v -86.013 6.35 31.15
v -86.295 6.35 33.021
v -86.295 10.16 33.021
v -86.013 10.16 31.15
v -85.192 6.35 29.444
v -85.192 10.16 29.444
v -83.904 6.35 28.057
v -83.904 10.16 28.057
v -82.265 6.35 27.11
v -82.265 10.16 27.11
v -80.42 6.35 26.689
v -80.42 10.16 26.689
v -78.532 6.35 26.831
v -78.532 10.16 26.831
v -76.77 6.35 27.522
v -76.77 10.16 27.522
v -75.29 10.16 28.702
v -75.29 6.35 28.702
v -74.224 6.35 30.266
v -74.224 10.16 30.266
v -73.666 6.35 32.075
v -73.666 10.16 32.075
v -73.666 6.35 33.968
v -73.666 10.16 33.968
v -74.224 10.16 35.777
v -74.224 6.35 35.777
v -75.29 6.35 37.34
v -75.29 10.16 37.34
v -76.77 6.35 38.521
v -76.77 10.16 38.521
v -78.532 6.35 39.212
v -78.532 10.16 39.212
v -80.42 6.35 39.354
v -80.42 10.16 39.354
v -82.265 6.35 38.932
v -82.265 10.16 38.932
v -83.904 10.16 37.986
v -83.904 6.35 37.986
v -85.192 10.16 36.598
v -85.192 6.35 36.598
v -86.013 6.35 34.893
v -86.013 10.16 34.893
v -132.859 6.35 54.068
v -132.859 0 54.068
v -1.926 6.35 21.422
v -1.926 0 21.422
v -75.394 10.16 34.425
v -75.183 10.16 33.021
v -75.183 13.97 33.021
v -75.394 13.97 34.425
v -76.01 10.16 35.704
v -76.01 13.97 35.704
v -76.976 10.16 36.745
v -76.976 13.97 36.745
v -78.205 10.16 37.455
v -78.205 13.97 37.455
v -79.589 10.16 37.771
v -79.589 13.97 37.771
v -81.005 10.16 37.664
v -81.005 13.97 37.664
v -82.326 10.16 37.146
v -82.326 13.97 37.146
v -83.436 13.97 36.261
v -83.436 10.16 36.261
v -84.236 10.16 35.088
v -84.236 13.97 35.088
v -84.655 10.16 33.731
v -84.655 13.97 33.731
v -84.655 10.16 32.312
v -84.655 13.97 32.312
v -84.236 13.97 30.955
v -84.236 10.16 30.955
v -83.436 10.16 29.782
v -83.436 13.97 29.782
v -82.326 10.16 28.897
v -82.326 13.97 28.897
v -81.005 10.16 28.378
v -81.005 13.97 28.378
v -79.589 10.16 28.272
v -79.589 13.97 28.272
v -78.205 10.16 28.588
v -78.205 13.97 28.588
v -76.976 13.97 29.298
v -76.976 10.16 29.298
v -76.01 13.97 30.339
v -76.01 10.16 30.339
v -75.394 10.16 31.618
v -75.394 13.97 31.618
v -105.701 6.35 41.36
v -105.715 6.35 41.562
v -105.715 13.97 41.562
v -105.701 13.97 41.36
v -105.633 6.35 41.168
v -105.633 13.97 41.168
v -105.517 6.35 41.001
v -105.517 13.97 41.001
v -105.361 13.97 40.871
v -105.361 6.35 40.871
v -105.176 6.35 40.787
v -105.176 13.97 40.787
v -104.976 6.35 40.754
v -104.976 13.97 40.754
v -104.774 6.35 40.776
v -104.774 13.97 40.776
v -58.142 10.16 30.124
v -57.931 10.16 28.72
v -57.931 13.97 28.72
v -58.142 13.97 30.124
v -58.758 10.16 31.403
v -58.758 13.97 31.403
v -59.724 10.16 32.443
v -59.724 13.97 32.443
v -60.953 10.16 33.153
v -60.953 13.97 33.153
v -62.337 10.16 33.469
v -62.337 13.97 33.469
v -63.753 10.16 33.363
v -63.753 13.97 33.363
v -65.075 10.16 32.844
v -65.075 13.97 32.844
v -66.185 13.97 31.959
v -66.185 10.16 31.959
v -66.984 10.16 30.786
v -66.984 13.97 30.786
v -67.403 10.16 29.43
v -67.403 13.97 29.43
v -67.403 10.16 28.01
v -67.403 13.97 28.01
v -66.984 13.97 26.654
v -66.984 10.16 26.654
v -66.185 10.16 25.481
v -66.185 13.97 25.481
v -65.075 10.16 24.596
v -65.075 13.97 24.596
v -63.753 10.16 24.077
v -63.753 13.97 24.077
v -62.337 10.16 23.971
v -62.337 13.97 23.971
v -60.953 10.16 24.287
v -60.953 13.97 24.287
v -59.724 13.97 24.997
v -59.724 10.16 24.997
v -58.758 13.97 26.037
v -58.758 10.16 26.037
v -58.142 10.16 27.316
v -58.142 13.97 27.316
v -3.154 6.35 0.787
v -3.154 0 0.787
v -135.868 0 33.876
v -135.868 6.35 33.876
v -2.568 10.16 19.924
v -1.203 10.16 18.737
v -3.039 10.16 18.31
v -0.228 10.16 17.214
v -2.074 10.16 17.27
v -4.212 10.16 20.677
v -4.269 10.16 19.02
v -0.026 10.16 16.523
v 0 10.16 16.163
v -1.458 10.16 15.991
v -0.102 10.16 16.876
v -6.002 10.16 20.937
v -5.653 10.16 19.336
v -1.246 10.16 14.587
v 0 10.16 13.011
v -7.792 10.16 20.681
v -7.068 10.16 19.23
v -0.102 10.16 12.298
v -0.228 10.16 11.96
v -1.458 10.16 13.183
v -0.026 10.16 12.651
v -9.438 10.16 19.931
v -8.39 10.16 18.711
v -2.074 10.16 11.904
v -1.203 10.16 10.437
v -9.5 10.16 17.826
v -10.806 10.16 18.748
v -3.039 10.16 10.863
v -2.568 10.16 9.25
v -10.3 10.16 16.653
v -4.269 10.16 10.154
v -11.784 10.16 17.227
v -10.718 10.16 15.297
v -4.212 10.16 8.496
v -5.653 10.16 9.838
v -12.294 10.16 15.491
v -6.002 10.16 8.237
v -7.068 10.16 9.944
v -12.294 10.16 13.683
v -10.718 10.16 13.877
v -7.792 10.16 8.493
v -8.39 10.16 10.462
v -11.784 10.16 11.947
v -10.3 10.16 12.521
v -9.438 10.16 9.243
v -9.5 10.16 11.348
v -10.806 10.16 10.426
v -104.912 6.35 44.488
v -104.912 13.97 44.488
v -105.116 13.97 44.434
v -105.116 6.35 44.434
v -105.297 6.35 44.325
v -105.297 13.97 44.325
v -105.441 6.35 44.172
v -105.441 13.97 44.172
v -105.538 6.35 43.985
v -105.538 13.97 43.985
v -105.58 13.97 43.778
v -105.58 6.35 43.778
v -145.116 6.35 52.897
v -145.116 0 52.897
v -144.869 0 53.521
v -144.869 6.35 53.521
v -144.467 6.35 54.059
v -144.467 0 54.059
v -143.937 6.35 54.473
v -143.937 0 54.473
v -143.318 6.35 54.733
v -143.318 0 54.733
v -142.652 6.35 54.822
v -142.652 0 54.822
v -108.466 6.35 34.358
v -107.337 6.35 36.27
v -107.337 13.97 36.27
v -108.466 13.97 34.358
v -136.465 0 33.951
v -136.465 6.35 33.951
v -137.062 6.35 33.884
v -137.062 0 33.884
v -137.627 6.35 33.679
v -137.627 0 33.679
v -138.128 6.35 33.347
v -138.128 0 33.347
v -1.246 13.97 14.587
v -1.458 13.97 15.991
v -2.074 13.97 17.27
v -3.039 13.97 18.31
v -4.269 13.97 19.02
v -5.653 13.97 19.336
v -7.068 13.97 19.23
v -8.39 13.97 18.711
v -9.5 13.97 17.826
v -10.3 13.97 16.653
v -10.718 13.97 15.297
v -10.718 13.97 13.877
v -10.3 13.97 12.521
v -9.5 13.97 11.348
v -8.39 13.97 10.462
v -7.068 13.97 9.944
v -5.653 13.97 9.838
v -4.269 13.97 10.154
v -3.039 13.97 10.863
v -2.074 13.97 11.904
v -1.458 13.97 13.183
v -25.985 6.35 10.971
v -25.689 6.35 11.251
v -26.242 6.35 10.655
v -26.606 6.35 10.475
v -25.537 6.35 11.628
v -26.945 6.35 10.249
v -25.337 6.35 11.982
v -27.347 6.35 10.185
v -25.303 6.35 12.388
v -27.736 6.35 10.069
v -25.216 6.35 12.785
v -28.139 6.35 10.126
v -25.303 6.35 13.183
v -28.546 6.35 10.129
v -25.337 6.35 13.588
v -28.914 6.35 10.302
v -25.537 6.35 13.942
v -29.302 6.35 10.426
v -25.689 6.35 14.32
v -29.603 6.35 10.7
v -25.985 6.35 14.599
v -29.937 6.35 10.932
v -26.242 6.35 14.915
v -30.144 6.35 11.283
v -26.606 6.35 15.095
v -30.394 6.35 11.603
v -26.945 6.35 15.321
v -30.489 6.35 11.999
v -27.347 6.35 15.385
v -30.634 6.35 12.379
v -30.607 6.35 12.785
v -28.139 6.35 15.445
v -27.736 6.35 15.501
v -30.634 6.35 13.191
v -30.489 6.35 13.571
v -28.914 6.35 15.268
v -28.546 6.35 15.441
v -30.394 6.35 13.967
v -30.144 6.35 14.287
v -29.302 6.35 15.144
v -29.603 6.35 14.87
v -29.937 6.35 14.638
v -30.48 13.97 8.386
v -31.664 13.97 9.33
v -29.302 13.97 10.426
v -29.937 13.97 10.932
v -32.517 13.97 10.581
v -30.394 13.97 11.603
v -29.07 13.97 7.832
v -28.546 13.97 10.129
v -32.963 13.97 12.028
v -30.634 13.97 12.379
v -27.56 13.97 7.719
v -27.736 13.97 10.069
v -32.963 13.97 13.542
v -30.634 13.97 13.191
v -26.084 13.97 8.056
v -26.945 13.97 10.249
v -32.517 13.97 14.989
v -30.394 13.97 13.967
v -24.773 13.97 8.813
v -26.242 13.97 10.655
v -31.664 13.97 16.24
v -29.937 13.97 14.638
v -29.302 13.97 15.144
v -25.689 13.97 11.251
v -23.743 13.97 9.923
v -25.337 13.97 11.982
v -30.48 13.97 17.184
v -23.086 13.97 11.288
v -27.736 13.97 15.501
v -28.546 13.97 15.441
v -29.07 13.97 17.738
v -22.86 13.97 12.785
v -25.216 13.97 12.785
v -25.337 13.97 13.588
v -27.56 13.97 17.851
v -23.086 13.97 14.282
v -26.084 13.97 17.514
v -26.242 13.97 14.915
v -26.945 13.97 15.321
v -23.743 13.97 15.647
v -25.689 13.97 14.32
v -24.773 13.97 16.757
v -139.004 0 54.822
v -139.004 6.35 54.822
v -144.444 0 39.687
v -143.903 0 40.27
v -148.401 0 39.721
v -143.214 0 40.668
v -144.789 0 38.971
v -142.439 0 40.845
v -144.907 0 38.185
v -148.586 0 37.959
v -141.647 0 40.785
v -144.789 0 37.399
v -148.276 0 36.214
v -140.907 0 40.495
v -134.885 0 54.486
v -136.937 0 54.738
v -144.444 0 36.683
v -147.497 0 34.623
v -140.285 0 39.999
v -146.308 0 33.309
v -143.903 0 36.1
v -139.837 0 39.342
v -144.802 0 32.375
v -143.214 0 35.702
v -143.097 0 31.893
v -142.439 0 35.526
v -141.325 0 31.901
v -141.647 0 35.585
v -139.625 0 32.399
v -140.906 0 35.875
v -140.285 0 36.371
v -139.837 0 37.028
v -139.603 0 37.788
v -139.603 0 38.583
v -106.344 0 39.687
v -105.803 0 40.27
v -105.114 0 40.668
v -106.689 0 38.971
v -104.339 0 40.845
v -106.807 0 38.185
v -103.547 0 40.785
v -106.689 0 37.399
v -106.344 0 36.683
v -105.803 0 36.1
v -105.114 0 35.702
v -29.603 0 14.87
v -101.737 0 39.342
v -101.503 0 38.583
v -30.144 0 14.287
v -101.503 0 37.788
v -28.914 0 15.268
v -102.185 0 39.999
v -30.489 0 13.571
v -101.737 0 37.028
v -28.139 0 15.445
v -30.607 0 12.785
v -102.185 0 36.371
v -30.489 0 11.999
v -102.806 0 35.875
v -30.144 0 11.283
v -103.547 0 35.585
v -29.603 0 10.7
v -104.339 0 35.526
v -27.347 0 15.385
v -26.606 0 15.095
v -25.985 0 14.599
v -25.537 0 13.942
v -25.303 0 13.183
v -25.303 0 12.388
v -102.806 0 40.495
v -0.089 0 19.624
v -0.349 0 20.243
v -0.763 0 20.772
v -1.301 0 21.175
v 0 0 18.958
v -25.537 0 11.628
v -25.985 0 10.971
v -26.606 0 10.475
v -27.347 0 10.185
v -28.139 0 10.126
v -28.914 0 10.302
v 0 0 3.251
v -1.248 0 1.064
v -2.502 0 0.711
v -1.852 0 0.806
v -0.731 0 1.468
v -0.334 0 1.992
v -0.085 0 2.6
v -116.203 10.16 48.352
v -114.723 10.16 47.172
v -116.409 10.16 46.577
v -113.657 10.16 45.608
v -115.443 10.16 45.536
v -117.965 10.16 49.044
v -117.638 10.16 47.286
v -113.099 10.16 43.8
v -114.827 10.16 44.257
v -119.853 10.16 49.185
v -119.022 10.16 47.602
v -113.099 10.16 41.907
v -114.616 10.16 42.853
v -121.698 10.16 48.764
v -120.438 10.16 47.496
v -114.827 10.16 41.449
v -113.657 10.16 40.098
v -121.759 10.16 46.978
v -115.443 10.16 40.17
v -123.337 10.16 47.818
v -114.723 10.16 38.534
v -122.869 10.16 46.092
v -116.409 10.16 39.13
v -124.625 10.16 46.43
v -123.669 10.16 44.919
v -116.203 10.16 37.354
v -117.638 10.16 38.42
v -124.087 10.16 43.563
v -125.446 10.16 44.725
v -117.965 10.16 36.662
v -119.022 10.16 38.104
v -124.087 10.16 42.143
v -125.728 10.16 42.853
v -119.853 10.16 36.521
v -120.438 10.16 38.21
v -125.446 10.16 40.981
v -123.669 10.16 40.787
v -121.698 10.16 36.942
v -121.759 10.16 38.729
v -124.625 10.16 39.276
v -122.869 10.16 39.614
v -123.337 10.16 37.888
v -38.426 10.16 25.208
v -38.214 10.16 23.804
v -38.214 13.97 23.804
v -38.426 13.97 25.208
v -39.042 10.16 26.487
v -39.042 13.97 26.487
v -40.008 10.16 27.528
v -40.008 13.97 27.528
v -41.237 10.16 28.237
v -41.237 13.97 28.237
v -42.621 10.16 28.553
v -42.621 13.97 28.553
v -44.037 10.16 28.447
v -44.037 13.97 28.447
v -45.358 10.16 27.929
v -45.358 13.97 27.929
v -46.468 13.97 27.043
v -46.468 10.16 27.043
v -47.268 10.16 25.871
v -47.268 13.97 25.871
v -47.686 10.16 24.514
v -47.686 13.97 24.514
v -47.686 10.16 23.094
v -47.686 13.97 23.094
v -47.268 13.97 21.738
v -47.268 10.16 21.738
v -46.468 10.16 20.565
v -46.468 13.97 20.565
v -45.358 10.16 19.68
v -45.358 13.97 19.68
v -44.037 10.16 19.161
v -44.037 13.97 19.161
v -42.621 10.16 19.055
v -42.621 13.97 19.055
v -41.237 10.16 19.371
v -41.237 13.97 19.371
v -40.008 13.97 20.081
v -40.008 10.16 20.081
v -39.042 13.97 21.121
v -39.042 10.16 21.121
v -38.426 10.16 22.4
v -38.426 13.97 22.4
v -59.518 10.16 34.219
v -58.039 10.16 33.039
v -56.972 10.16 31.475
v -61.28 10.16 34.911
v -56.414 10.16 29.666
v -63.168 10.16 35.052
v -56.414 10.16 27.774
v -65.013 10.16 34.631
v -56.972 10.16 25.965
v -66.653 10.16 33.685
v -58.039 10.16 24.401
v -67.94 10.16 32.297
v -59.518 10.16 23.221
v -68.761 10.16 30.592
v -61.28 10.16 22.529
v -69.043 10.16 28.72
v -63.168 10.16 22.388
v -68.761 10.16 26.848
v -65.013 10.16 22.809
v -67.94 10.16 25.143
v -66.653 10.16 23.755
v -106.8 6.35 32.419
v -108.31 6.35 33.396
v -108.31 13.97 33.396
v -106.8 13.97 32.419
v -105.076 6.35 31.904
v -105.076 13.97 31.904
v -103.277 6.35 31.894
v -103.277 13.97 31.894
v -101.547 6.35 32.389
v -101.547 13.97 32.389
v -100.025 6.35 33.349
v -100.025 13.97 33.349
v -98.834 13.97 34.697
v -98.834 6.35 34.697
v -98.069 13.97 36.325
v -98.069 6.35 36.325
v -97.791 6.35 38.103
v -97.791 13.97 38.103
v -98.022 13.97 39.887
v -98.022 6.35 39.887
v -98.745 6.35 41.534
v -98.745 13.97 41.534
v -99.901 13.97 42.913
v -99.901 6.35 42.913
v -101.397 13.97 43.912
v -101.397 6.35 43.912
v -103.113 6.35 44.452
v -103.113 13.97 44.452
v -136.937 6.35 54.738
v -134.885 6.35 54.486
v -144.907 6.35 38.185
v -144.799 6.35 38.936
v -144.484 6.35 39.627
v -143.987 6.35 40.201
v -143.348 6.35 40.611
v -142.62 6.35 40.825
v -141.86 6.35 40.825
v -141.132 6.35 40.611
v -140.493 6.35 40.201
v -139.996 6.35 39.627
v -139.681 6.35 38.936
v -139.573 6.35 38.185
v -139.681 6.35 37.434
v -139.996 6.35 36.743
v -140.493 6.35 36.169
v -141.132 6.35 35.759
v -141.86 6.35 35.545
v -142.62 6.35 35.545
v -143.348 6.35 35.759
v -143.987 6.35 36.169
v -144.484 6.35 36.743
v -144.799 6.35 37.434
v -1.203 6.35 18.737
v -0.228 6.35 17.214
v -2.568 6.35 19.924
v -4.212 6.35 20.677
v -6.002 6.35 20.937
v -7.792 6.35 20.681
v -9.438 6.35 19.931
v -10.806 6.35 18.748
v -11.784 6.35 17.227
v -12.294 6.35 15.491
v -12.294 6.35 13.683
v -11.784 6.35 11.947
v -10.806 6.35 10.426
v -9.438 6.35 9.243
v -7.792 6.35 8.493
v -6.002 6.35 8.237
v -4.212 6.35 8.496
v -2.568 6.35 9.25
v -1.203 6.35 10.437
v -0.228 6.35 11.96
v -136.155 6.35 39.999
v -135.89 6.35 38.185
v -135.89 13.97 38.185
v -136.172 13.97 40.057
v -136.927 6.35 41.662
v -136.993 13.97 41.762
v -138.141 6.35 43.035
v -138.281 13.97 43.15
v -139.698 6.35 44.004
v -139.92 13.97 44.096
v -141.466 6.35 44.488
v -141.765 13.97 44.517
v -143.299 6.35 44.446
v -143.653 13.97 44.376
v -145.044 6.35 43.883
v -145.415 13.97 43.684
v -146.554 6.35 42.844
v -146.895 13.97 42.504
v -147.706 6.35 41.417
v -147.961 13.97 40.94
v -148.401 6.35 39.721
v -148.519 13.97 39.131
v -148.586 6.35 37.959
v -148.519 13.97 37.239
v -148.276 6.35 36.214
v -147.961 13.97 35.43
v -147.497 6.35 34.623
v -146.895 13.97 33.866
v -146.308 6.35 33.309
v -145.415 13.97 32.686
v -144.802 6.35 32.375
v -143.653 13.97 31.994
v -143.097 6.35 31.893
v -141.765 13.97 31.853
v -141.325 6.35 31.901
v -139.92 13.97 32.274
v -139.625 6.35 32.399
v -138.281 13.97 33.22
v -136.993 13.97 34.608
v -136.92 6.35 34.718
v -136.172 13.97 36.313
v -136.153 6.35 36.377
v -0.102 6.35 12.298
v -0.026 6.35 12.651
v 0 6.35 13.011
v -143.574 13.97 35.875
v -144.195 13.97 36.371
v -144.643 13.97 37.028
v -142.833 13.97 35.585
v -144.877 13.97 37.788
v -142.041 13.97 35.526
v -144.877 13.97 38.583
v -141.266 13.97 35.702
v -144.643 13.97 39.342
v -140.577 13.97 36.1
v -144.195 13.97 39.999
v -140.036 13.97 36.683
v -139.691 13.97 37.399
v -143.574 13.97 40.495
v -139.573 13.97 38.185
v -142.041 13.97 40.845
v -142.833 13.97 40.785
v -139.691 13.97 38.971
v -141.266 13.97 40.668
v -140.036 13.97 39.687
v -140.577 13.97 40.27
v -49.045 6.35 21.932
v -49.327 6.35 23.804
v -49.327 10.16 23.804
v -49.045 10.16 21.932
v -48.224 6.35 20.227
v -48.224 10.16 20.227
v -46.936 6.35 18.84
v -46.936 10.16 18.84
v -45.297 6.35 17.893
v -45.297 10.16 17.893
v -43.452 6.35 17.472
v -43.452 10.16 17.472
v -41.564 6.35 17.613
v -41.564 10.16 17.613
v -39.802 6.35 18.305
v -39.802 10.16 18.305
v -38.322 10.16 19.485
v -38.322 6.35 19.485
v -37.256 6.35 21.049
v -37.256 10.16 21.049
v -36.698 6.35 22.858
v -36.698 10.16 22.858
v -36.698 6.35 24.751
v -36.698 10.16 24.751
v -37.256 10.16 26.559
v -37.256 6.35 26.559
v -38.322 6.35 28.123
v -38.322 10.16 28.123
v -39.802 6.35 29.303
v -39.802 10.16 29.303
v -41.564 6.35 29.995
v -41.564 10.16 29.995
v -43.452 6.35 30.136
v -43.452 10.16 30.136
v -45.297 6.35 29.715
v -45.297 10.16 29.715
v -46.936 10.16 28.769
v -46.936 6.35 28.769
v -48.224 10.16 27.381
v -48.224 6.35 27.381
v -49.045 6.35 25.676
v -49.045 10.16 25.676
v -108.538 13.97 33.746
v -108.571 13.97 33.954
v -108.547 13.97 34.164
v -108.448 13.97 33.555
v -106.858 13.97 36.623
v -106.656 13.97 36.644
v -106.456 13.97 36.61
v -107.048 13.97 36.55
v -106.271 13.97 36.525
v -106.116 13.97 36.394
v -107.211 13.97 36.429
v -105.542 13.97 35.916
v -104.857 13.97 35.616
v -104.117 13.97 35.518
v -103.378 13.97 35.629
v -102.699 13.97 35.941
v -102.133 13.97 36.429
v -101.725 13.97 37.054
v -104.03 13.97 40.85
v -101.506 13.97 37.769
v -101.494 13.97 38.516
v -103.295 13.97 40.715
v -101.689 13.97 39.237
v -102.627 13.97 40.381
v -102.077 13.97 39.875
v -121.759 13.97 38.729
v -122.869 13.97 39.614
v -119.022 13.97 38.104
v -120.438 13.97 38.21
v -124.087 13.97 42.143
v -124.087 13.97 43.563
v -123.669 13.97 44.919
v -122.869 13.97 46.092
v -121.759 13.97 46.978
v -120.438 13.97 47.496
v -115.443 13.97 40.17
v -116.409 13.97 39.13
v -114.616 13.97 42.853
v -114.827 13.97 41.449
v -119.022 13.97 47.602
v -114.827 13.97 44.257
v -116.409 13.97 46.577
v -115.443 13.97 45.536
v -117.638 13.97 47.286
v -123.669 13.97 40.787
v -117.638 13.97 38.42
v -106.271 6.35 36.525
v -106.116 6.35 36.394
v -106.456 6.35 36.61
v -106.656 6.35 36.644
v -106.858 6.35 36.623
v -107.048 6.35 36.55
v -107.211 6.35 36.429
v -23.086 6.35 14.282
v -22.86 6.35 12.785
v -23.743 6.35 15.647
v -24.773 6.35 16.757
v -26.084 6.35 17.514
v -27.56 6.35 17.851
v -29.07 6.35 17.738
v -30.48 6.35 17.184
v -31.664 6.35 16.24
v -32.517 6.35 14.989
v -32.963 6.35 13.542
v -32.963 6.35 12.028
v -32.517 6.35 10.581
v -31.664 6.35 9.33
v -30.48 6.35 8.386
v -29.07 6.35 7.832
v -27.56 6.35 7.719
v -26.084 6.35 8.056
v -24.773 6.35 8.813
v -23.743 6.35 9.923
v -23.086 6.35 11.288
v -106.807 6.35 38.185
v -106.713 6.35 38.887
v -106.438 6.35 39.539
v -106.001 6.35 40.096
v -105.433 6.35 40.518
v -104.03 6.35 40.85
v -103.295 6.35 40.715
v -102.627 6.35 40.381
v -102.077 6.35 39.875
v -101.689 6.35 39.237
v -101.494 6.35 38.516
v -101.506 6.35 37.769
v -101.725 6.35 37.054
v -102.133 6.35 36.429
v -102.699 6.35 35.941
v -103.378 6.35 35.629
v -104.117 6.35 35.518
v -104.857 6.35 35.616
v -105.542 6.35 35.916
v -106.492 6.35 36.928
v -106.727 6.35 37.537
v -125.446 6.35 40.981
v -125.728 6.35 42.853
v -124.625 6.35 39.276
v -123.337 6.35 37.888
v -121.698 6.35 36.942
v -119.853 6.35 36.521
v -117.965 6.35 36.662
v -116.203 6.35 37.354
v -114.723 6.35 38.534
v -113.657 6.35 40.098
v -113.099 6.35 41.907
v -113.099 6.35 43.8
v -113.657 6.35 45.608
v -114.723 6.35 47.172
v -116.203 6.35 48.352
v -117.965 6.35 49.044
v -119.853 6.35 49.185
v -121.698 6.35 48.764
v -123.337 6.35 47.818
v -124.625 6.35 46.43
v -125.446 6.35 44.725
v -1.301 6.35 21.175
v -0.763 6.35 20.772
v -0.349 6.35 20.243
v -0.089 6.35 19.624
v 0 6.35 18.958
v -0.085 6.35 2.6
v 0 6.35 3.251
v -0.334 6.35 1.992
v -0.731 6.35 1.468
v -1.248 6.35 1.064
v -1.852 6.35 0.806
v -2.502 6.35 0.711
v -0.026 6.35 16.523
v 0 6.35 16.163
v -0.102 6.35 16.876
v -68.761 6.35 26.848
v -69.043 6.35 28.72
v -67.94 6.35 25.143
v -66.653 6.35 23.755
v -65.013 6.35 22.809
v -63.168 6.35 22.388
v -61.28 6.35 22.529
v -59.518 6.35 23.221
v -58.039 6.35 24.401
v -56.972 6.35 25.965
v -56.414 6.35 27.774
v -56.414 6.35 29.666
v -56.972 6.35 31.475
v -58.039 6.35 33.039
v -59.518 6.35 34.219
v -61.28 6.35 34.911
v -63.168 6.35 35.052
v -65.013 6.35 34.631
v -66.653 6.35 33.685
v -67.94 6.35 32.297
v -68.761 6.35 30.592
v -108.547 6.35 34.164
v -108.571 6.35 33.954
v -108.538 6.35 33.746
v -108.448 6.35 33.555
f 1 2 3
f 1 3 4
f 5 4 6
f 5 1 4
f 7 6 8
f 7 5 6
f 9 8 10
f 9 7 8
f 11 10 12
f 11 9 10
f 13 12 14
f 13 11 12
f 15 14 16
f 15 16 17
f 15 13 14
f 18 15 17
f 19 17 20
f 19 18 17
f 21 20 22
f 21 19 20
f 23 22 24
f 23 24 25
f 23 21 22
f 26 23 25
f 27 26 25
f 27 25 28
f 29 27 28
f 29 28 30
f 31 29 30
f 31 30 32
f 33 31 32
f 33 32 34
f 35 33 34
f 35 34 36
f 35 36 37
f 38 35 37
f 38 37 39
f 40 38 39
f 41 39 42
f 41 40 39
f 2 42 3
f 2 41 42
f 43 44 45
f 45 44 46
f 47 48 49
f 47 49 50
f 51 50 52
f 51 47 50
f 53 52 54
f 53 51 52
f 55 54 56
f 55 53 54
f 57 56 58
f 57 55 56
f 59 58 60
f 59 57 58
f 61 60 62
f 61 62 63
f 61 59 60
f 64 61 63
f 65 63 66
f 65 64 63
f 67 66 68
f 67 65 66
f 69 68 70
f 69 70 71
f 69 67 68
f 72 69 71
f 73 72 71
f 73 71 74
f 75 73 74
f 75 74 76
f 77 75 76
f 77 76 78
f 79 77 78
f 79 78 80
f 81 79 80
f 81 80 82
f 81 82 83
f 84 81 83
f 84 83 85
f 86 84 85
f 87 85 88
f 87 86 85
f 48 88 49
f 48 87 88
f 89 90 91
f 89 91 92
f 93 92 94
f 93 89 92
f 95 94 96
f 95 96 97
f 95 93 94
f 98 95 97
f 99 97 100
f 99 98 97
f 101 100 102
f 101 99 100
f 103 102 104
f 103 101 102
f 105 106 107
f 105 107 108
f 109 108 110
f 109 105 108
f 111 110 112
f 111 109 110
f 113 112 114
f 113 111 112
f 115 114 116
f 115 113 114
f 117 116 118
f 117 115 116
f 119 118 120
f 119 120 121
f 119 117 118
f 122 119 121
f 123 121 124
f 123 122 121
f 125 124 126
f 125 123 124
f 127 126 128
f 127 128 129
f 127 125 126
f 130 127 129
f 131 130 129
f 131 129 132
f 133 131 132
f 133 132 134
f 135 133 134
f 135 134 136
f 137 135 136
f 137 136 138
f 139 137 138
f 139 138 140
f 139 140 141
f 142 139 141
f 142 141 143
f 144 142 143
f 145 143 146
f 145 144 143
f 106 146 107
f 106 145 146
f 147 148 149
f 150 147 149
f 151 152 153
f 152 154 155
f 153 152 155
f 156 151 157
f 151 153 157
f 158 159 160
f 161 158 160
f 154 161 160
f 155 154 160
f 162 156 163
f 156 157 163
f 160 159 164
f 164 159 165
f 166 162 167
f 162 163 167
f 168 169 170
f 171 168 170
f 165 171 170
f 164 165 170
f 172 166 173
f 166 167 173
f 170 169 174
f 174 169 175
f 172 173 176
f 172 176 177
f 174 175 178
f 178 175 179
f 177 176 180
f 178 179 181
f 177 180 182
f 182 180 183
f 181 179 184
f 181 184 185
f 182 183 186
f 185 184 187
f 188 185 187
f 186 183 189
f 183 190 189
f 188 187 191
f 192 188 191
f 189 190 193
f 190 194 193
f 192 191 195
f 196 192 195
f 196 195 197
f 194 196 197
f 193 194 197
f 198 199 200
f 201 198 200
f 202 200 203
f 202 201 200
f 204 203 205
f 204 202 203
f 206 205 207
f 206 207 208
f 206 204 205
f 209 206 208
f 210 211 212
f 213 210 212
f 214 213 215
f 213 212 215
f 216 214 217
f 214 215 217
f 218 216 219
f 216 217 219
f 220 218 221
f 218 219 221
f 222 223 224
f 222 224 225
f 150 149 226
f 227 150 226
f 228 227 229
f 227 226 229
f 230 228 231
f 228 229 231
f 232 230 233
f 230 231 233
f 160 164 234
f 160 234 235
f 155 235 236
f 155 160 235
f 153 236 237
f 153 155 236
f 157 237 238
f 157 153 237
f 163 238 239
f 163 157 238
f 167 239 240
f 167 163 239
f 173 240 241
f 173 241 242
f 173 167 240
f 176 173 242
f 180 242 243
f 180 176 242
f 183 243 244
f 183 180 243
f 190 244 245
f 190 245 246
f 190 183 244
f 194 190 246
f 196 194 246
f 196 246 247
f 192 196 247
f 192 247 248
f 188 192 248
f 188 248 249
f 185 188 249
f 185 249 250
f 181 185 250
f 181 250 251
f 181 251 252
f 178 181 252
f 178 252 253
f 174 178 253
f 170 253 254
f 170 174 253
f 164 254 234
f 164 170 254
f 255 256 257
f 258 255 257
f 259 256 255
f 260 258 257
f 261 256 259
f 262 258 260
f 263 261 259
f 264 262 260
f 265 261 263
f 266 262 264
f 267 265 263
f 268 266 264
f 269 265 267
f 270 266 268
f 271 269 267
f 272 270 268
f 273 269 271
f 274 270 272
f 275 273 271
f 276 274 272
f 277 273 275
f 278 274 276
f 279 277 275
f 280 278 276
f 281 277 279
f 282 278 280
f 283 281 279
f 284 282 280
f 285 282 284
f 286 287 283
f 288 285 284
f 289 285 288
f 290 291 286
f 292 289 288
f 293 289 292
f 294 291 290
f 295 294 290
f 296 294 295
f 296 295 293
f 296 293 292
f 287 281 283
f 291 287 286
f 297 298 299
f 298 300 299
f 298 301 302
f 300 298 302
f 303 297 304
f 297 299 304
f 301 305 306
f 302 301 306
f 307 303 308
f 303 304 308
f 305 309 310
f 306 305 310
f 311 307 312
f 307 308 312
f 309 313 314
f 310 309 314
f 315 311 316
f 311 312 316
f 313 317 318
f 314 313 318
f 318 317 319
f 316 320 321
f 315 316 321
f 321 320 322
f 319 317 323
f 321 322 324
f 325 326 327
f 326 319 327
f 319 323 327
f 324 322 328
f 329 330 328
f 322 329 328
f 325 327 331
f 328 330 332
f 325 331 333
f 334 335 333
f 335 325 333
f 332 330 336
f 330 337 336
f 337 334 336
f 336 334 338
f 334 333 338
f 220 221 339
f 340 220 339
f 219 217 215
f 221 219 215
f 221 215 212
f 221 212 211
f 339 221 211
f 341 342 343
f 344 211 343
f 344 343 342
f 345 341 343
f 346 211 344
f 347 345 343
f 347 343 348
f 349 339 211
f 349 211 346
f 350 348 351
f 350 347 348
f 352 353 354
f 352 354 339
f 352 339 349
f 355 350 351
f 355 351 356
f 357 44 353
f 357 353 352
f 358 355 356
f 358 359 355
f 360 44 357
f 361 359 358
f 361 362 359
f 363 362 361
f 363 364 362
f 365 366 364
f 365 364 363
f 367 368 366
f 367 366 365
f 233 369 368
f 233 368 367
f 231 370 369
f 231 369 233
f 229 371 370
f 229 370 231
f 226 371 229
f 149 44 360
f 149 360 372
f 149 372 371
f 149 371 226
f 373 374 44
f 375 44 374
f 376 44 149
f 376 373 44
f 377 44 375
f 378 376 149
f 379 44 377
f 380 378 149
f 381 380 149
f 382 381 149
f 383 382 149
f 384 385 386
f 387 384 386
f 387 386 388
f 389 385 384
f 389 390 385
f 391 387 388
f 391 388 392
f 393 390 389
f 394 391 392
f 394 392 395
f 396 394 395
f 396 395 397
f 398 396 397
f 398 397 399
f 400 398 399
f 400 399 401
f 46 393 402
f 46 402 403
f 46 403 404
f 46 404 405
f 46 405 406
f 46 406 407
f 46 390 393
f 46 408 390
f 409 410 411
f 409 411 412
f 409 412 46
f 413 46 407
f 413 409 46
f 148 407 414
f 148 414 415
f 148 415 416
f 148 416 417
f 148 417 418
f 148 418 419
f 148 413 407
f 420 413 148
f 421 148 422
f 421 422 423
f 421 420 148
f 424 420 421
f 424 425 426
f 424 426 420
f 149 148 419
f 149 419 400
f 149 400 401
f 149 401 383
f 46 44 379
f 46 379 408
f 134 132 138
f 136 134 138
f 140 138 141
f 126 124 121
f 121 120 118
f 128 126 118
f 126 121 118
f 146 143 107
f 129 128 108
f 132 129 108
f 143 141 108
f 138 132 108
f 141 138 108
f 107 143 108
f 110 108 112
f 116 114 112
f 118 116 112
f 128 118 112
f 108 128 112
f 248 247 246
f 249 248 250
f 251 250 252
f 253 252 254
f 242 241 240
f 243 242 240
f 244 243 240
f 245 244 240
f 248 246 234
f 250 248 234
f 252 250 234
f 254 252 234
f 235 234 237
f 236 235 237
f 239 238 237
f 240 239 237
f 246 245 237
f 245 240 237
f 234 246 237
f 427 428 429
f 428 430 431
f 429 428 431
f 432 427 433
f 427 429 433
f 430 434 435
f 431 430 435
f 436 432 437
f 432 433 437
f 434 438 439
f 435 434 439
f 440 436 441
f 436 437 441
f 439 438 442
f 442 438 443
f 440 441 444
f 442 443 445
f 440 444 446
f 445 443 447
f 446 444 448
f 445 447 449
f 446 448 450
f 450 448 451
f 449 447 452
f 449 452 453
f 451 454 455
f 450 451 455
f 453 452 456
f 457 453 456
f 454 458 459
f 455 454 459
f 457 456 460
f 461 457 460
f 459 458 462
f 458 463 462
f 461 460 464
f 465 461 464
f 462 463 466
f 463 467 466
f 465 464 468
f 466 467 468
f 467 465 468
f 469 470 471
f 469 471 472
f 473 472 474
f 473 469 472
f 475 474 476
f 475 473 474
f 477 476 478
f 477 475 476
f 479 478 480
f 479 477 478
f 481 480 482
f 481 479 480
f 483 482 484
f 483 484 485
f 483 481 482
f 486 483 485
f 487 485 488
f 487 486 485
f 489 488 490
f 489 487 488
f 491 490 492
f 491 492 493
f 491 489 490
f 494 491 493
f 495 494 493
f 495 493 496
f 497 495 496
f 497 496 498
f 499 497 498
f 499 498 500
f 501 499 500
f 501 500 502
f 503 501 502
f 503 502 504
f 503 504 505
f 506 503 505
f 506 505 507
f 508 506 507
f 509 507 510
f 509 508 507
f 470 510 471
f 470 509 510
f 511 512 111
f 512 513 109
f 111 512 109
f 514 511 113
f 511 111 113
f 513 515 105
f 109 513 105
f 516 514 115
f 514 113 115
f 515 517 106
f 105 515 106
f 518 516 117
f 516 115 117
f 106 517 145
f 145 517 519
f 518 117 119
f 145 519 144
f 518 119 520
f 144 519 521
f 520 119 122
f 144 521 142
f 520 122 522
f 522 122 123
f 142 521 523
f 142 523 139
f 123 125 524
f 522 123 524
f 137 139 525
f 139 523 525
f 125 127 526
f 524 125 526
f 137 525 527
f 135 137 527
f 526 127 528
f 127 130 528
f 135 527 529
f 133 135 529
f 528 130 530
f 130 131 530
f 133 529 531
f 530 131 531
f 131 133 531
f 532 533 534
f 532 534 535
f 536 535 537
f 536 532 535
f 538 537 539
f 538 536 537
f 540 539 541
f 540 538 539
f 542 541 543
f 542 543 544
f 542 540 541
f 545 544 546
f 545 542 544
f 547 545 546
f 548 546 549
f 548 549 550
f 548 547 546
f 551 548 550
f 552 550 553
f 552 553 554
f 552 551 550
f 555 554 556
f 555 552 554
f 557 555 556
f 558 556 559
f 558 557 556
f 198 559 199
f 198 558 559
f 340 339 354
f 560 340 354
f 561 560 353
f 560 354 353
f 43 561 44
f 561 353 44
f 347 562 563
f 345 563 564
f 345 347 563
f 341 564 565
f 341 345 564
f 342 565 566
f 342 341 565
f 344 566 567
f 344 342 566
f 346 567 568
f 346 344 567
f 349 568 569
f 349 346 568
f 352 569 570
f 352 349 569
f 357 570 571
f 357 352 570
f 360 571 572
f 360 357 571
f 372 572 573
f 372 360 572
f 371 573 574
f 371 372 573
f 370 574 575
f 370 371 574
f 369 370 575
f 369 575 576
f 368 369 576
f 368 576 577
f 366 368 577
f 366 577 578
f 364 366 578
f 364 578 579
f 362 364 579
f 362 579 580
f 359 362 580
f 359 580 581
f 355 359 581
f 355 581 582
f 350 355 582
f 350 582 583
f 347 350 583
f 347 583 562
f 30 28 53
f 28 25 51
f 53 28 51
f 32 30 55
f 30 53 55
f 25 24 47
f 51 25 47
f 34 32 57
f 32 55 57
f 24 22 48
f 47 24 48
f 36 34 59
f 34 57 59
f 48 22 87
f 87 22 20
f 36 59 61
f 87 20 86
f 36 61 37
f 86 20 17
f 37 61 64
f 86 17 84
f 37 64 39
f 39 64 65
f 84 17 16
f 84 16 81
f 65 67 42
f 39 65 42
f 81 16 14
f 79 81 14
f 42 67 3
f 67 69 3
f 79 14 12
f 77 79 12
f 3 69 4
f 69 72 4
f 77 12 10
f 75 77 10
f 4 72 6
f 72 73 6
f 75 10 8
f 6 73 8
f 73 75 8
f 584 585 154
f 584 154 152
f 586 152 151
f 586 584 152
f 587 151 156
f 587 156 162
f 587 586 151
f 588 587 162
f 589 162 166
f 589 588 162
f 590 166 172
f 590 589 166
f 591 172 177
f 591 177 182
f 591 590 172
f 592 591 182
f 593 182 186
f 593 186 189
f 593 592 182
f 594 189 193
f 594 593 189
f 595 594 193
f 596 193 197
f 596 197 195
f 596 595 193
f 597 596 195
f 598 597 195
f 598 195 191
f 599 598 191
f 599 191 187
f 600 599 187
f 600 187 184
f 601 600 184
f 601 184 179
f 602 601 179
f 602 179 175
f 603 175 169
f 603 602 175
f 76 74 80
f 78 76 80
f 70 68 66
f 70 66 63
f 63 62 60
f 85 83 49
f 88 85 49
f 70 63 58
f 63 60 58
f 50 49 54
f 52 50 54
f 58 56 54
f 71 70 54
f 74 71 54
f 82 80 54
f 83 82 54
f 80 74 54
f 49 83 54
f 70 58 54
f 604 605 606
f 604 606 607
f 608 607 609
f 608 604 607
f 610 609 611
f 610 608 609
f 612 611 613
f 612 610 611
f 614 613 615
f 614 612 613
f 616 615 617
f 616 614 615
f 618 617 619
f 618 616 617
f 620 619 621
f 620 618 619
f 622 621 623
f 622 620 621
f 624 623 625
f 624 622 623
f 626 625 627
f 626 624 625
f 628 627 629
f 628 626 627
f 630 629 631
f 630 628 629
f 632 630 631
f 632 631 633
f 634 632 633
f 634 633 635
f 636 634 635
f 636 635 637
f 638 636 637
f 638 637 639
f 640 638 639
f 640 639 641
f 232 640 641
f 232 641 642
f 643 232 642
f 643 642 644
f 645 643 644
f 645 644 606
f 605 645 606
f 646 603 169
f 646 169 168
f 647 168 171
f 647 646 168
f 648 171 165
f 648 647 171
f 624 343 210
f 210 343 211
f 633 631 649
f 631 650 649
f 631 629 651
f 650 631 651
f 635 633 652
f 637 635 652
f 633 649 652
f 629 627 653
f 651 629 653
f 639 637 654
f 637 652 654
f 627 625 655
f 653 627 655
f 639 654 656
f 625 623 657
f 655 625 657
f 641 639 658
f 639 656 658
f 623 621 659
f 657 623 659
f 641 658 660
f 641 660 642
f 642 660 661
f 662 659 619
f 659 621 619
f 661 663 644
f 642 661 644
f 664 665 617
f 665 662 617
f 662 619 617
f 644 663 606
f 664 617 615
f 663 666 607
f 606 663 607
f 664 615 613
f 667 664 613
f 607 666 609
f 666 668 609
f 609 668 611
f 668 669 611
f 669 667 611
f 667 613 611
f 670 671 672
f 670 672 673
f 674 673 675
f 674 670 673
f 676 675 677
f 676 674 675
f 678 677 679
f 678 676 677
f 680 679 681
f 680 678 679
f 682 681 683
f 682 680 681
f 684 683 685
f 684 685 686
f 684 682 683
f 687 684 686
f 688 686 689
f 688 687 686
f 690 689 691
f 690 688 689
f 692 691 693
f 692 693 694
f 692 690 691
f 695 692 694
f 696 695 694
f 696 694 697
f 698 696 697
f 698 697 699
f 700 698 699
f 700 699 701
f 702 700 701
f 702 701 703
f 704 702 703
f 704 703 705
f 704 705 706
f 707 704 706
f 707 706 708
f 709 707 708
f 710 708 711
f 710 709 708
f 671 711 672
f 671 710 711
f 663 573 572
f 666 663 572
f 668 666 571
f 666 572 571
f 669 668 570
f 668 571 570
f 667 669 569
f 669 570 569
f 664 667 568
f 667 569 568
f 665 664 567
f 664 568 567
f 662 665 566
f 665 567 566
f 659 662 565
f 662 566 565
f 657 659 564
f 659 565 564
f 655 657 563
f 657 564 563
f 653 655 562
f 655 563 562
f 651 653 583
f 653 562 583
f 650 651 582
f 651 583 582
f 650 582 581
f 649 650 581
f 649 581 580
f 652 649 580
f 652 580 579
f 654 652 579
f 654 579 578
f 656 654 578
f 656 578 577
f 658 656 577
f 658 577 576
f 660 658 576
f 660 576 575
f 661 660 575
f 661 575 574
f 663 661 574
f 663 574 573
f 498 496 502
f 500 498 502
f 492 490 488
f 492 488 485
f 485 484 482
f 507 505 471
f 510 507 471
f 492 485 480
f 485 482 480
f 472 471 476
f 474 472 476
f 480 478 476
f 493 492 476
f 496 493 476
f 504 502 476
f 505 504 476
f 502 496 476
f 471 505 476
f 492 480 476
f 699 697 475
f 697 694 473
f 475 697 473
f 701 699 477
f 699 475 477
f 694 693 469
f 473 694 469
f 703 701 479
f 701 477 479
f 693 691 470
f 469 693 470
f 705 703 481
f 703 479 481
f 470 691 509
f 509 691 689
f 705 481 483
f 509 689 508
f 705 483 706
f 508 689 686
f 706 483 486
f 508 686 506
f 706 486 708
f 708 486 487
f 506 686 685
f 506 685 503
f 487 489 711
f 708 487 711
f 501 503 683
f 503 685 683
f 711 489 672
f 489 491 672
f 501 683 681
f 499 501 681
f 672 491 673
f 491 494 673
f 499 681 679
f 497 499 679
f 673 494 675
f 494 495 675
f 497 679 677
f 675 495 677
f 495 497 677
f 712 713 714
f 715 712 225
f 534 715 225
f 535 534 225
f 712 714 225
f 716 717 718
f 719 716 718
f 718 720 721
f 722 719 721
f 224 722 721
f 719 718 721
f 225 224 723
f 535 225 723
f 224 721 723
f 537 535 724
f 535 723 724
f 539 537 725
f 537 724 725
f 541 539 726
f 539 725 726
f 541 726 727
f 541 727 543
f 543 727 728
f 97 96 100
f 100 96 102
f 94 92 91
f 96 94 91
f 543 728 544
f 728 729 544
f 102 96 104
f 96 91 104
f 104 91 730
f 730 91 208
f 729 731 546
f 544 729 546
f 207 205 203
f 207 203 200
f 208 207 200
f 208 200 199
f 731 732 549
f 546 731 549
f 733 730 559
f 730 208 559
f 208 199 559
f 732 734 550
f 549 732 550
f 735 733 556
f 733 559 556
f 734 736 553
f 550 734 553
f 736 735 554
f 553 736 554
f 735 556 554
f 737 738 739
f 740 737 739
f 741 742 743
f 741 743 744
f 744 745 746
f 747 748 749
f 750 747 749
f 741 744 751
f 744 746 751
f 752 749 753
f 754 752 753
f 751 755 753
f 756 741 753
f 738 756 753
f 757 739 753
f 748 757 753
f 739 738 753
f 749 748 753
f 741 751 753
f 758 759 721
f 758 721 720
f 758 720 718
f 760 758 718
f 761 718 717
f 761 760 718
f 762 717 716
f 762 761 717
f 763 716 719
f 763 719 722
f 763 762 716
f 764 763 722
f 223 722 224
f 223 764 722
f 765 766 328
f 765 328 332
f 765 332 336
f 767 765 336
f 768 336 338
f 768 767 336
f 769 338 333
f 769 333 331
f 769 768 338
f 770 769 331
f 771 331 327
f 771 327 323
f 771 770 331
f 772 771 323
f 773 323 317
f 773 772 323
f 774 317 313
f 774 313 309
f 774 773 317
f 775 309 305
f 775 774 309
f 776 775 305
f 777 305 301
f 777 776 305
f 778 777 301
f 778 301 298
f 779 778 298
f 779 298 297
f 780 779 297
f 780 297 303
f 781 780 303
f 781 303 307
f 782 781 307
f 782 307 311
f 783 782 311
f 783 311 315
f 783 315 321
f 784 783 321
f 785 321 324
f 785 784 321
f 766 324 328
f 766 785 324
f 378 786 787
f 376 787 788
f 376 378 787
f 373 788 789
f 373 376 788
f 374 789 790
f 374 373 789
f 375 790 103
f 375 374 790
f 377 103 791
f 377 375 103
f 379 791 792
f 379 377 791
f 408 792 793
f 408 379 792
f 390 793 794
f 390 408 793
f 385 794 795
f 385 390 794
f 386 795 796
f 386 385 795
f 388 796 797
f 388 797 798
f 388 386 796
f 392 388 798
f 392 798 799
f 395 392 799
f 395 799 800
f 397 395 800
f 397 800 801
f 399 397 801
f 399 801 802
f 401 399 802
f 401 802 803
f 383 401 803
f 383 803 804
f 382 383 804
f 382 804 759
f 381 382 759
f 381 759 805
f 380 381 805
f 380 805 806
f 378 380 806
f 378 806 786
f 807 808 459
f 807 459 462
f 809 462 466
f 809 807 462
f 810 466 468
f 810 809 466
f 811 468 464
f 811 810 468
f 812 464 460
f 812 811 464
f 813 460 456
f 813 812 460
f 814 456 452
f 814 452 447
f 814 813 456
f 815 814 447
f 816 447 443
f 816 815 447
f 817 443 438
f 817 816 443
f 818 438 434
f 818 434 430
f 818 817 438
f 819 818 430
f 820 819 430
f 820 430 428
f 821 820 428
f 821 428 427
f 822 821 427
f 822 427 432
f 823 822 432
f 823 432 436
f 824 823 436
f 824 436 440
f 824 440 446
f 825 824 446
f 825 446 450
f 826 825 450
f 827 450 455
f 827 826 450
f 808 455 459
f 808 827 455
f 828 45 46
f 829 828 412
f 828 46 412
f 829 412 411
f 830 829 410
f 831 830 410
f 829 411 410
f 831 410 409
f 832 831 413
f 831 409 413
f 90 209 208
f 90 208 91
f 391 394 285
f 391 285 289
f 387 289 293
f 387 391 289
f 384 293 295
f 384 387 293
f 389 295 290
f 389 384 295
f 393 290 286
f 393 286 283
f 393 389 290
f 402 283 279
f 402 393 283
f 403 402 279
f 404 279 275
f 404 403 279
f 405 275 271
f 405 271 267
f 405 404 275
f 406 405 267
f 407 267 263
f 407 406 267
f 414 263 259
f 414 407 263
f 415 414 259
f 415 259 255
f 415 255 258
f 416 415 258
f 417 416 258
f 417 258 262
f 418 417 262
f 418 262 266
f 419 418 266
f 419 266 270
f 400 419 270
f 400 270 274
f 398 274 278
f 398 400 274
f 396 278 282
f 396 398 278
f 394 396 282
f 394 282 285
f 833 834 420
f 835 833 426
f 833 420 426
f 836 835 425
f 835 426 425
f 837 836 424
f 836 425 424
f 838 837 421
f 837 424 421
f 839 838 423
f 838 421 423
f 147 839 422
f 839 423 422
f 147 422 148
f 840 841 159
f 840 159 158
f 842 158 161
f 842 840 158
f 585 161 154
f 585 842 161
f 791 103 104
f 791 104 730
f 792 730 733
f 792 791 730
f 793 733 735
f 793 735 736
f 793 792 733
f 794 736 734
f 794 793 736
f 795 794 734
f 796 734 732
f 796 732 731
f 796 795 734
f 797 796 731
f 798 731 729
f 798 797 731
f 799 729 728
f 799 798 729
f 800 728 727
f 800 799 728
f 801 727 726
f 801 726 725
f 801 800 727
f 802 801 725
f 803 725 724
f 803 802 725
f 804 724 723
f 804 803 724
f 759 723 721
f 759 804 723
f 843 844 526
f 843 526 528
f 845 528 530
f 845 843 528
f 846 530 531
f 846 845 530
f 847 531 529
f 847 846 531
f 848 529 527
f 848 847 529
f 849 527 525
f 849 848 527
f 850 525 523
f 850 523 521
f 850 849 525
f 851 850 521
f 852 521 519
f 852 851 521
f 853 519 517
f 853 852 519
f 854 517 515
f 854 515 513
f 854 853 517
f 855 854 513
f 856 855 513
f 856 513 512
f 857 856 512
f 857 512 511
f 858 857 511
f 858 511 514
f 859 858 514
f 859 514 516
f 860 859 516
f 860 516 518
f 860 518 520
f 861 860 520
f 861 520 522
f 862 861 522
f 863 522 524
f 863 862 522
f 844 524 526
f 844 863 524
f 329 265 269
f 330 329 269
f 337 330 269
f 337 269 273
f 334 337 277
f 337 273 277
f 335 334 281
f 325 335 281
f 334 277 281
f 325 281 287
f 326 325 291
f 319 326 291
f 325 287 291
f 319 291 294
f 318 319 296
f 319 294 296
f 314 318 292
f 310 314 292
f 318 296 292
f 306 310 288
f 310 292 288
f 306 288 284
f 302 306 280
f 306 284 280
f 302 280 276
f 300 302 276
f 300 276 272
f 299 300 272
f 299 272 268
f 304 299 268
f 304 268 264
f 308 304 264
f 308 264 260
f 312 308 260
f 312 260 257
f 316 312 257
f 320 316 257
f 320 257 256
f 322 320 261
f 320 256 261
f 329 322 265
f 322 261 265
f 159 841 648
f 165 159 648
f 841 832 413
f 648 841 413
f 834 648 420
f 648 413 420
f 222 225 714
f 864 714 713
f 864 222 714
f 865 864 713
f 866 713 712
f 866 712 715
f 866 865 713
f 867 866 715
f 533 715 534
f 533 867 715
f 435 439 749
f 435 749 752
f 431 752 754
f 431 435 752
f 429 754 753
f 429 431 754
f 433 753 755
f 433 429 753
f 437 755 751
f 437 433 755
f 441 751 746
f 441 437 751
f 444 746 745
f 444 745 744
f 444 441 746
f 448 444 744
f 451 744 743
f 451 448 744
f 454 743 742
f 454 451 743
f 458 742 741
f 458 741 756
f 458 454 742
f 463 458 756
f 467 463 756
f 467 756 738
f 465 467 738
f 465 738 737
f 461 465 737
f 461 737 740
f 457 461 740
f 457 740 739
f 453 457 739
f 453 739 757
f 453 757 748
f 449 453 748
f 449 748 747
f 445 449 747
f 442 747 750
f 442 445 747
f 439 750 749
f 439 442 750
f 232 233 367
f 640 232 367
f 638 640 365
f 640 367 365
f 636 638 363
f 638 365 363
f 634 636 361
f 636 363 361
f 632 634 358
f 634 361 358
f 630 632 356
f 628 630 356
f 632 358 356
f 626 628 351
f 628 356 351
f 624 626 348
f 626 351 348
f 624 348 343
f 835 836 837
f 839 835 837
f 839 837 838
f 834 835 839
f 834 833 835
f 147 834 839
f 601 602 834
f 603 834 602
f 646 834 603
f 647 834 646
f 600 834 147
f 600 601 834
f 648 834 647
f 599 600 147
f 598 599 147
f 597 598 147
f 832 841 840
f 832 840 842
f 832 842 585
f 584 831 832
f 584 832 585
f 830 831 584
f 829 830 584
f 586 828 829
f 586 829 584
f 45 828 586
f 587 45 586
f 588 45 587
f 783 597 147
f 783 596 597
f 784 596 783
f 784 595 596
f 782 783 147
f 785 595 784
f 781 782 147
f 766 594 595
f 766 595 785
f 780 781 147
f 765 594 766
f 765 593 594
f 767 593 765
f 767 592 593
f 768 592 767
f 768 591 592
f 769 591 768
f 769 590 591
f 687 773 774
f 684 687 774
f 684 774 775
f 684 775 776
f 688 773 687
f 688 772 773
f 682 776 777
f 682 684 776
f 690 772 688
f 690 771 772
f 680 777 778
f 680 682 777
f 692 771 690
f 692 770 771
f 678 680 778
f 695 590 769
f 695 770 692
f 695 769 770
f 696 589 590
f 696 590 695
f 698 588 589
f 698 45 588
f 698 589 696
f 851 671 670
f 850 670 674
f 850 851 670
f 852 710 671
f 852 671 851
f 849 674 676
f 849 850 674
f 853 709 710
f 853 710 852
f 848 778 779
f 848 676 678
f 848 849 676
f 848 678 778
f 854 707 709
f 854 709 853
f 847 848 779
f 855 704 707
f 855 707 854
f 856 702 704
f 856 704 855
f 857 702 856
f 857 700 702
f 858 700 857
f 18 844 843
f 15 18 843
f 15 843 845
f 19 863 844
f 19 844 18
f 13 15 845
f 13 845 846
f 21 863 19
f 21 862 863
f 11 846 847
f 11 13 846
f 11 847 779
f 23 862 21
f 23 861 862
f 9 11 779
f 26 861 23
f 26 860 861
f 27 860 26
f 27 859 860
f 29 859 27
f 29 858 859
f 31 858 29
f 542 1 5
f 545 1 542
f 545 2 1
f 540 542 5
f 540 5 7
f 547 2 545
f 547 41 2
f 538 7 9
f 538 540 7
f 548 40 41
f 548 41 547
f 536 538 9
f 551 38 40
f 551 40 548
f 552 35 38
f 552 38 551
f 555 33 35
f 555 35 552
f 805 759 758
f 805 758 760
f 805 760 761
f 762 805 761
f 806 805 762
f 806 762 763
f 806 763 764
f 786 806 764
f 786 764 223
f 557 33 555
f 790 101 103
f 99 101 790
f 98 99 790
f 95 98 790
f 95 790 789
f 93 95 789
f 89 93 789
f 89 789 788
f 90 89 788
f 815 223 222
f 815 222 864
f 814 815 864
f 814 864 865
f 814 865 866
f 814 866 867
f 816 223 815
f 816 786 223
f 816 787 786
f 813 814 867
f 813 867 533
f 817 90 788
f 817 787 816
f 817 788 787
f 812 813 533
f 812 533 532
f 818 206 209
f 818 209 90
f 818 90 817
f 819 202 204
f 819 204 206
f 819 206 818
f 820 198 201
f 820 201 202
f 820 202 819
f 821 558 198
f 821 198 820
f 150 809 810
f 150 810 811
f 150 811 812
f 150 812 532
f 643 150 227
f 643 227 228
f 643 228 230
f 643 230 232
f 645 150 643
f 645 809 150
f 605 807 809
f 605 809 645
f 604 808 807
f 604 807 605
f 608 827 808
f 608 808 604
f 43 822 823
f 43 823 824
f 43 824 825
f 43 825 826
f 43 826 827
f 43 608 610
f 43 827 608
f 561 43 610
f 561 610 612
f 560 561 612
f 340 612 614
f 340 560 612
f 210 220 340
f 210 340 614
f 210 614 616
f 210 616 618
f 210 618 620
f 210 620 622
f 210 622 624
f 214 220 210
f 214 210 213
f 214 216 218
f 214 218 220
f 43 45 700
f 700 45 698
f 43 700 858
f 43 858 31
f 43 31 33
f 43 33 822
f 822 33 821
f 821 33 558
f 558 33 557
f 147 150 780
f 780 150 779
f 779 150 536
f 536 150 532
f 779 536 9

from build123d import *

# Parameters (mm, degrees)
SKETCH1_R               = 2.667
BOSS_EXTRUDE1_DEPTH     = 6.35
SKETCH3_R               = 6.35
BOSS_EXTRUDE2_DEPTH     = 3.81
SKETCH4_R               = 4.7625
BOSS_EXTRUDE3_DEPTH     = 3.81
SKETCH5_R               = 6.35
SKETCH5_R_2             = 2.667
SKETCH5_R_3             = 5.08
SKETCH5_R_4             = 2.723974981
BOSS_EXTRUDE4_DEPTH     = 7.62
SKETCH6_W               = 54.822055163
SKETCH6_H               = 25.4
CUT_EXTRUDE2_DEPTH      = 10.414
CUT_EXTRUDE2_DEPTH_BACK = 156.972


with BuildPart() as part:
    # Sketch1 → Boss-Extrude1 (new body)
    with BuildSketch(Plane(origin=(0, 0, 0), x_dir=(-1, 0, 0), z_dir=(0, 1, 0))):
        with BuildLine():
            Line((132.859114436, 54.06756661), (1.925518385, 21.422154602))
            ThreePointArc((1.925518385, 21.422154602), (0.538452686, 20.521383604), (0, 18.957603457))
            Line((0, 18.957603457), (0, 3.251051746))
            ThreePointArc((0, 3.251051746), (0.976219853, 1.249504432), (3.154481615, 0.786500601))
            Line((3.154481615, 0.786500601), (135.868185597, 33.875743365))
            ThreePointArc((135.868185597, 33.875743365), (137.061865325, 33.884273203), (138.127619437, 33.346581632))
            ThreePointArc((138.127619437, 33.346581632), (145.587943549, 32.789337046), (148.401377862, 39.7212592))
            Line((148.401377862, 39.7212592), (145.116412217, 52.896536778))
            ThreePointArc((145.116412217, 52.896536778), (144.215641219, 54.283602477), (142.651861072, 54.822055163))
            Line((142.651861072, 54.822055163), (139.003930584, 54.822055163))
            ThreePointArc((139.003930584, 54.822055163), (135.908449262, 54.632727415), (132.859114436, 54.06756661))
        make_face()
        with Locations((142.24, 38.185055163)):
            Circle(SKETCH1_R, mode=Mode.SUBTRACT)
        with Locations((27.94, 12.785055202)):
            Circle(SKETCH1_R, mode=Mode.SUBTRACT)
        with Locations((104.14, 38.185055202)):
            Circle(SKETCH1_R, mode=Mode.SUBTRACT)
    boss_extrude1 = extrude(amount=-BOSS_EXTRUDE1_DEPTH)

    # Sketch3 → Boss-Extrude2 (add)
    with BuildSketch(Plane(origin=(0, -6.35, 0), x_dir=(-1, 0, 0), z_dir=(0, -1, 0))):
        with Locations((42.976982051, -23.804158196)):
            Circle(SKETCH3_R)
        with Locations((79.945249222, -33.021382418)):
            Circle(SKETCH3_R)
        with Locations((119.378067538, -42.853088255)):
            Circle(SKETCH3_R)
        with Locations((62.693391209, -28.720011114)):
            Circle(SKETCH3_R)
        with BuildLine():
            Line((0, -13.010825767), (0, -16.16304218))
            ThreePointArc((0, -16.16304218), (0.057532424, -16.700587281), (0.227523413, -17.213780985))
            ThreePointArc((0.227523413, -17.213780985), (12.35871488, -14.586933973), (0.227523413, -11.960086962))
            ThreePointArc((0.227523413, -11.960086962), (0.057532424, -12.473280666), (0, -13.010825767))
        make_face()
    boss_extrude2 = extrude(amount=BOSS_EXTRUDE2_DEPTH)

    # Sketch4 → Boss-Extrude3 (add)
    with BuildSketch(Plane.XZ.offset(10.16)):
        with Locations((-6.00871488, 14.586933973)):
            Circle(SKETCH4_R)
        with Locations((-42.976982051, 23.804158196)):
            Circle(SKETCH4_R)
        with Locations((-62.693391209, 28.720011114)):
            Circle(SKETCH4_R)
        with Locations((-79.945249222, 33.021382418)):
            Circle(SKETCH4_R)
        with Locations((-119.378067538, 42.853088255)):
            Circle(SKETCH4_R)
    boss_extrude3 = extrude(amount=BOSS_EXTRUDE3_DEPTH)

    # Sketch5 → Boss-Extrude4 (add)
    with BuildSketch(Plane.XZ.offset(6.35)):
        with Locations((-142.24, 38.185055163)):
            Circle(SKETCH5_R)
        with Locations((-142.24, 38.185055163)):
            Circle(SKETCH5_R_2, mode=Mode.SUBTRACT)
        with Locations((-27.94, 12.785055202)):
            Circle(SKETCH5_R_3)
        with Locations((-27.94, 12.785055202)):
            Circle(SKETCH5_R_4, mode=Mode.SUBTRACT)
        with BuildLine():
            Line((-105.580163175, 43.777970545), (-105.715311414, 41.562252701))
            ThreePointArc((-105.715311414, 41.562252701), (-105.443232026, 40.931048752), (-104.773674962, 40.775681582))
            ThreePointArc((-104.773674962, 40.775681582), (-101.589970205, 37.403878498), (-106.115998075, 36.393876649))
            ThreePointArc((-106.115998075, 36.393876649), (-106.757692083, 36.64019843), (-107.336634242, 36.269696613))
            Line((-107.336634242, 36.269696613), (-108.465736097, 34.358466745))
            ThreePointArc((-108.465736097, 34.358466745), (-108.561892576, 33.849199875), (-108.310080465, 33.396221428))
            ThreePointArc((-108.310080465, 33.396221428), (-98.068500487, 36.325110669), (-104.912246263, 44.487922463))
            ThreePointArc((-104.912246263, 44.487922463), (-105.374571656, 44.25371306), (-105.580163175, 43.777970545))
        make_face()
    boss_extrude4 = extrude(amount=BOSS_EXTRUDE4_DEPTH)

    # Mirror6: Boss-Extrude1, Boss-Extrude2, Boss-Extrude3, Boss-Extrude4 across plane
    add(boss_extrude1.mirror(Plane(origin=(-139.003930584, 0, 29.422055163), x_dir=(0, 0, 1), z_dir=(0, -1, 0))))
    add(boss_extrude2.mirror(Plane(origin=(-139.003930584, 0, 29.422055163), x_dir=(0, 0, 1), z_dir=(0, -1, 0))))
    add(boss_extrude3.mirror(Plane(origin=(-139.003930584, 0, 29.422055163), x_dir=(0, 0, 1), z_dir=(0, -1, 0))))
    add(boss_extrude4.mirror(Plane(origin=(-139.003930584, 0, 29.422055163), x_dir=(0, 0, 1), z_dir=(0, -1, 0))))

    # Sketch6 → Cut-Extrude2 (cut, two sides)
    with BuildSketch(Plane(origin=(0, 0, 0), x_dir=(0, 0, -1), z_dir=(1, 0, 0))) as cut_extrude2_sk:
        with Locations((-27.411027582, -12.7)):
            Rectangle(SKETCH6_W, SKETCH6_H)
    extrude(amount=CUT_EXTRUDE2_DEPTH, mode=Mode.SUBTRACT)
    extrude(cut_extrude2_sk.sketch, amount=-CUT_EXTRUDE2_DEPTH_BACK, mode=Mode.SUBTRACT)


solid = part.part
